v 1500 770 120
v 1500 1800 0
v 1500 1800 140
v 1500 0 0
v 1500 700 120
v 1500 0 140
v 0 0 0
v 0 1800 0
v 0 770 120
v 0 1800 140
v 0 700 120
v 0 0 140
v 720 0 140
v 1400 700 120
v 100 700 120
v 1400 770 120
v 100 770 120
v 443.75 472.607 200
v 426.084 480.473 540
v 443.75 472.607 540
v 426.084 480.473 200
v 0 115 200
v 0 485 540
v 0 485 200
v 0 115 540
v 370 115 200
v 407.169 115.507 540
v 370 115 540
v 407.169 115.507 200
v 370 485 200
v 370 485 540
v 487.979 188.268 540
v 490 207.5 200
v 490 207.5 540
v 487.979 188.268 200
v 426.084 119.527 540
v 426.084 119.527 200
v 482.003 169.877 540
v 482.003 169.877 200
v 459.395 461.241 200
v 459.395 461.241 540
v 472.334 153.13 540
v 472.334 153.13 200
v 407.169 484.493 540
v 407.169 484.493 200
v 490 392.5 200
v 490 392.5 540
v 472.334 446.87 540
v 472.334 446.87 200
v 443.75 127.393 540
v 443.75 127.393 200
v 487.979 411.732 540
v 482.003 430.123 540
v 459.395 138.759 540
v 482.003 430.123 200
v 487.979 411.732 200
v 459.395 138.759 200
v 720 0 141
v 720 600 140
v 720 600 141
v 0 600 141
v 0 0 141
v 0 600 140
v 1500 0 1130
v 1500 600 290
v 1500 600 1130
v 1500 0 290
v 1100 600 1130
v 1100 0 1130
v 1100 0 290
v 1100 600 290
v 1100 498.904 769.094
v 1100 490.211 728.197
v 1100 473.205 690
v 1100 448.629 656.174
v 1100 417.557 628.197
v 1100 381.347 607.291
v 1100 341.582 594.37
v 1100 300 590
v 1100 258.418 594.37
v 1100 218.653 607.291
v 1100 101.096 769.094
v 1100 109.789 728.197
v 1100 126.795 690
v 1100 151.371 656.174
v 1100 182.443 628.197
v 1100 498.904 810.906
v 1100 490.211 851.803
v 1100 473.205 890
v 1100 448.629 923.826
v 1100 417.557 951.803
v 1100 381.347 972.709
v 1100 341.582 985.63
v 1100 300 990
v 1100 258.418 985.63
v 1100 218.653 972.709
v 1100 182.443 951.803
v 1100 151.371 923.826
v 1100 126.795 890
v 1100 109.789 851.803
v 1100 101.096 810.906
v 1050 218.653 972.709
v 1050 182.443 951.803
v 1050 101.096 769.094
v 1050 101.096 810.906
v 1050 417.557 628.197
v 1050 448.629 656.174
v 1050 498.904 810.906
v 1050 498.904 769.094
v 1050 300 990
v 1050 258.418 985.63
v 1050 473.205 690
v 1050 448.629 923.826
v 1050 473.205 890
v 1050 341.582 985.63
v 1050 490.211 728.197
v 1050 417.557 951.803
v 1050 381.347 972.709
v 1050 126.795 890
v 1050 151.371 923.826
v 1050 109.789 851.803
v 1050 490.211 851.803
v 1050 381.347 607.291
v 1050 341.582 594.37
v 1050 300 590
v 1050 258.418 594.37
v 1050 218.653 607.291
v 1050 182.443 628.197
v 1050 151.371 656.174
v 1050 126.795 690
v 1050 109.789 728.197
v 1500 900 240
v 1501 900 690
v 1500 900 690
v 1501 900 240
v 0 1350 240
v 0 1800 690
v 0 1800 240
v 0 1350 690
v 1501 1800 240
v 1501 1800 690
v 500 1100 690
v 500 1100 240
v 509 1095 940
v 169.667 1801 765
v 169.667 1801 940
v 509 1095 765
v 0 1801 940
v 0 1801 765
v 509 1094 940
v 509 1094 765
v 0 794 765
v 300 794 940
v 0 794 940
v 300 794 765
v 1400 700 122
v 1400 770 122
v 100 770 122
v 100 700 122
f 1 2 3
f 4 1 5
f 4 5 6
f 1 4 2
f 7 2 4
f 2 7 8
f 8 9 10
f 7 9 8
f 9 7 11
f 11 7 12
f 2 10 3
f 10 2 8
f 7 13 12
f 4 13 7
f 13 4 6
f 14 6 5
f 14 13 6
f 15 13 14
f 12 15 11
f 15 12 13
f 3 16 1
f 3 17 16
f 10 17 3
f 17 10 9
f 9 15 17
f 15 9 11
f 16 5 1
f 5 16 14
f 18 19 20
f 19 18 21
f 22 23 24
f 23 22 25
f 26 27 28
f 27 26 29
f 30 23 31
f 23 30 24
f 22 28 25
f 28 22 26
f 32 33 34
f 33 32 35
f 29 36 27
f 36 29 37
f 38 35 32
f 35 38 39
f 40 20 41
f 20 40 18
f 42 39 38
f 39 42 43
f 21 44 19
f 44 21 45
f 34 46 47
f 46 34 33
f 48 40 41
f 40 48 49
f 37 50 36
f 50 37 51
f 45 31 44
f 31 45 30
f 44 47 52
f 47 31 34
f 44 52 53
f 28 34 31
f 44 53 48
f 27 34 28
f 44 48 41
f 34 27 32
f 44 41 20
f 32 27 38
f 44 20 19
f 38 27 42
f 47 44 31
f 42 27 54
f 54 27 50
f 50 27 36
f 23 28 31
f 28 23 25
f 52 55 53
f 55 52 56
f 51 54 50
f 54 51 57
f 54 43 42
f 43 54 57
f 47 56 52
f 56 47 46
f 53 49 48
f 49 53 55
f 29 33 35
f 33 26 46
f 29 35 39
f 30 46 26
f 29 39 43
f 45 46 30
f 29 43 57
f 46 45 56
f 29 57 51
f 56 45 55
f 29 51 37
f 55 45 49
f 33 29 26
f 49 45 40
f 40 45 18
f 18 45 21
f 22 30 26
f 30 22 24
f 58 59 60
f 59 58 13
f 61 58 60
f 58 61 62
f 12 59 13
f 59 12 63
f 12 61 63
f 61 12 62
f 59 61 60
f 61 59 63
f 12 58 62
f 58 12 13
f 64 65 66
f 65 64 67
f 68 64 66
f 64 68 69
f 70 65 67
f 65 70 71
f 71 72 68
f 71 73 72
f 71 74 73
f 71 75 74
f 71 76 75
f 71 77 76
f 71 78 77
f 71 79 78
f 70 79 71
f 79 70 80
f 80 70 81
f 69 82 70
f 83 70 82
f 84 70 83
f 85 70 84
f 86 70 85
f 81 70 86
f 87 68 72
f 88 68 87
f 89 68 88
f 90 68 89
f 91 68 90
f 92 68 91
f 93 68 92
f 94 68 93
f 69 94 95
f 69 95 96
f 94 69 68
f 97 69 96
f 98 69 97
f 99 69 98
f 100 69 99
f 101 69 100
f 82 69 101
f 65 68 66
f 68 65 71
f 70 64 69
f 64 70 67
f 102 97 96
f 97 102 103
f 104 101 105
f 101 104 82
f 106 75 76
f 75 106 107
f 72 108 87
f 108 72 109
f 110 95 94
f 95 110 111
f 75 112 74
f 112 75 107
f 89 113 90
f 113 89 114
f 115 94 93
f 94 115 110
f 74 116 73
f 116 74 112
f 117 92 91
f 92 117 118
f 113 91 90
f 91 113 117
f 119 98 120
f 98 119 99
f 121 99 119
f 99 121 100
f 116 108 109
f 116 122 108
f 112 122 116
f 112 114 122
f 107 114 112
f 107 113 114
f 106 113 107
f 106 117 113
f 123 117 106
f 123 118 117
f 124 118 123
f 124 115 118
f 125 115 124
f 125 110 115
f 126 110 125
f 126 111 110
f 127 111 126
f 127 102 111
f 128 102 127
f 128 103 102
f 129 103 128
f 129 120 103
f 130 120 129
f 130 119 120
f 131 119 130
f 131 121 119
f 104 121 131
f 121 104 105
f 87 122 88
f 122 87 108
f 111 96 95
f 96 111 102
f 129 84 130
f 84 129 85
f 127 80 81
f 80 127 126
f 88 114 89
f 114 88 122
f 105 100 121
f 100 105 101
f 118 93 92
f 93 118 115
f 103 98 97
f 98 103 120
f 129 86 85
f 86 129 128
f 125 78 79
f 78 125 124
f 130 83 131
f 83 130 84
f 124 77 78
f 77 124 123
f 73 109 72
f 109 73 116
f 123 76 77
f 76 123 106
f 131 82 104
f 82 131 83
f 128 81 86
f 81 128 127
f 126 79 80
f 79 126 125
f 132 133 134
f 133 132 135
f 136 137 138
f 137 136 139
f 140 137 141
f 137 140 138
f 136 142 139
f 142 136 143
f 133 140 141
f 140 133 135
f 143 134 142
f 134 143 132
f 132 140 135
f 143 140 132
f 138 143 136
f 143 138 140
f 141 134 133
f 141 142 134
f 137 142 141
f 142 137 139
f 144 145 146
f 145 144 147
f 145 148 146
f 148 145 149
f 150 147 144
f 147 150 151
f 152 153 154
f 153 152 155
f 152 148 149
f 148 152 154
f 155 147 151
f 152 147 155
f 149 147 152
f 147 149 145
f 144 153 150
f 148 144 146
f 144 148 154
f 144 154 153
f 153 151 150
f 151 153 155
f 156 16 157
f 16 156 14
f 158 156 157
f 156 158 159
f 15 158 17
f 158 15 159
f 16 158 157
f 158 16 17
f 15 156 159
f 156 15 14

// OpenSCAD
L=1800;
W=1500;
H=2450;



%cube([1,L,H]);
%translate([0,L,0])cube([W,1,H]);


level=150;

color([0.5,0.5,0.5]) difference(){
    cube([W,L,140]);
    //translate([450,-1,100])cube([600,200,101]);
    
    hull(){
        translate([0,0,140]) cube([W,L,200]);
        translate([-10,700,140-20])cube([1600,70,10]);
    }
}

translate([100,700,140-28])color([0.2,0.3,0.5])cube([1300,70,10]);

translate([0,0,140]){
    translate([0,L-900,100]) tube();
    translate([0,L-1006,800-175]) sink();
    translate([0,300-370/2,0]) wc();
    
    translate([W-400,0,level]) washer();
}
//%translate([0,0,level-25]) cube([370+350,1000,25]);

%difference(){
    translate([0,-100,0])cube([W,100,H]);
    translate([450,-110,0]) cube([600,150,2000]);
}

module washer(){
    cube([400,600,840]);
    translate([0,300,500]) rotate([0,-90,0]) cylinder(h=50,r=200);
}


// https://i.sdvk.ru/i/Art-Max/RIMINI-AM204CHR-CHasha-unitaza-podvesnogo-bezobodkovogo-234851/356502.jpg
module wc(){
    
    translate([0,0,60])hull(){
        cube([370,370,340]);
        for(i=[-1,1]) translate([490-370/4,i*(370/4)+370/2]) 
            cylinder(h=340,r=370/4);
    }
    
    translate([0,-300+370/2,0]) cube([370+350,600,1]);
}

module tube(){
    w=[450,700,900];
    x=[0,500,1500];
    hull(){
        for(i=[0:2]) translate([x[i],900-w[i],0]) cube([1,w[i],450]);
    }
}

module sink(){
    w=[300,509,509/3];
    x=[0,300,1006];
    color([1,1,1,0.4])
    hull(){
        for(i=[0:2]) translate([0,x[i],0]) cube([w[i],1,175]);
    }
}
